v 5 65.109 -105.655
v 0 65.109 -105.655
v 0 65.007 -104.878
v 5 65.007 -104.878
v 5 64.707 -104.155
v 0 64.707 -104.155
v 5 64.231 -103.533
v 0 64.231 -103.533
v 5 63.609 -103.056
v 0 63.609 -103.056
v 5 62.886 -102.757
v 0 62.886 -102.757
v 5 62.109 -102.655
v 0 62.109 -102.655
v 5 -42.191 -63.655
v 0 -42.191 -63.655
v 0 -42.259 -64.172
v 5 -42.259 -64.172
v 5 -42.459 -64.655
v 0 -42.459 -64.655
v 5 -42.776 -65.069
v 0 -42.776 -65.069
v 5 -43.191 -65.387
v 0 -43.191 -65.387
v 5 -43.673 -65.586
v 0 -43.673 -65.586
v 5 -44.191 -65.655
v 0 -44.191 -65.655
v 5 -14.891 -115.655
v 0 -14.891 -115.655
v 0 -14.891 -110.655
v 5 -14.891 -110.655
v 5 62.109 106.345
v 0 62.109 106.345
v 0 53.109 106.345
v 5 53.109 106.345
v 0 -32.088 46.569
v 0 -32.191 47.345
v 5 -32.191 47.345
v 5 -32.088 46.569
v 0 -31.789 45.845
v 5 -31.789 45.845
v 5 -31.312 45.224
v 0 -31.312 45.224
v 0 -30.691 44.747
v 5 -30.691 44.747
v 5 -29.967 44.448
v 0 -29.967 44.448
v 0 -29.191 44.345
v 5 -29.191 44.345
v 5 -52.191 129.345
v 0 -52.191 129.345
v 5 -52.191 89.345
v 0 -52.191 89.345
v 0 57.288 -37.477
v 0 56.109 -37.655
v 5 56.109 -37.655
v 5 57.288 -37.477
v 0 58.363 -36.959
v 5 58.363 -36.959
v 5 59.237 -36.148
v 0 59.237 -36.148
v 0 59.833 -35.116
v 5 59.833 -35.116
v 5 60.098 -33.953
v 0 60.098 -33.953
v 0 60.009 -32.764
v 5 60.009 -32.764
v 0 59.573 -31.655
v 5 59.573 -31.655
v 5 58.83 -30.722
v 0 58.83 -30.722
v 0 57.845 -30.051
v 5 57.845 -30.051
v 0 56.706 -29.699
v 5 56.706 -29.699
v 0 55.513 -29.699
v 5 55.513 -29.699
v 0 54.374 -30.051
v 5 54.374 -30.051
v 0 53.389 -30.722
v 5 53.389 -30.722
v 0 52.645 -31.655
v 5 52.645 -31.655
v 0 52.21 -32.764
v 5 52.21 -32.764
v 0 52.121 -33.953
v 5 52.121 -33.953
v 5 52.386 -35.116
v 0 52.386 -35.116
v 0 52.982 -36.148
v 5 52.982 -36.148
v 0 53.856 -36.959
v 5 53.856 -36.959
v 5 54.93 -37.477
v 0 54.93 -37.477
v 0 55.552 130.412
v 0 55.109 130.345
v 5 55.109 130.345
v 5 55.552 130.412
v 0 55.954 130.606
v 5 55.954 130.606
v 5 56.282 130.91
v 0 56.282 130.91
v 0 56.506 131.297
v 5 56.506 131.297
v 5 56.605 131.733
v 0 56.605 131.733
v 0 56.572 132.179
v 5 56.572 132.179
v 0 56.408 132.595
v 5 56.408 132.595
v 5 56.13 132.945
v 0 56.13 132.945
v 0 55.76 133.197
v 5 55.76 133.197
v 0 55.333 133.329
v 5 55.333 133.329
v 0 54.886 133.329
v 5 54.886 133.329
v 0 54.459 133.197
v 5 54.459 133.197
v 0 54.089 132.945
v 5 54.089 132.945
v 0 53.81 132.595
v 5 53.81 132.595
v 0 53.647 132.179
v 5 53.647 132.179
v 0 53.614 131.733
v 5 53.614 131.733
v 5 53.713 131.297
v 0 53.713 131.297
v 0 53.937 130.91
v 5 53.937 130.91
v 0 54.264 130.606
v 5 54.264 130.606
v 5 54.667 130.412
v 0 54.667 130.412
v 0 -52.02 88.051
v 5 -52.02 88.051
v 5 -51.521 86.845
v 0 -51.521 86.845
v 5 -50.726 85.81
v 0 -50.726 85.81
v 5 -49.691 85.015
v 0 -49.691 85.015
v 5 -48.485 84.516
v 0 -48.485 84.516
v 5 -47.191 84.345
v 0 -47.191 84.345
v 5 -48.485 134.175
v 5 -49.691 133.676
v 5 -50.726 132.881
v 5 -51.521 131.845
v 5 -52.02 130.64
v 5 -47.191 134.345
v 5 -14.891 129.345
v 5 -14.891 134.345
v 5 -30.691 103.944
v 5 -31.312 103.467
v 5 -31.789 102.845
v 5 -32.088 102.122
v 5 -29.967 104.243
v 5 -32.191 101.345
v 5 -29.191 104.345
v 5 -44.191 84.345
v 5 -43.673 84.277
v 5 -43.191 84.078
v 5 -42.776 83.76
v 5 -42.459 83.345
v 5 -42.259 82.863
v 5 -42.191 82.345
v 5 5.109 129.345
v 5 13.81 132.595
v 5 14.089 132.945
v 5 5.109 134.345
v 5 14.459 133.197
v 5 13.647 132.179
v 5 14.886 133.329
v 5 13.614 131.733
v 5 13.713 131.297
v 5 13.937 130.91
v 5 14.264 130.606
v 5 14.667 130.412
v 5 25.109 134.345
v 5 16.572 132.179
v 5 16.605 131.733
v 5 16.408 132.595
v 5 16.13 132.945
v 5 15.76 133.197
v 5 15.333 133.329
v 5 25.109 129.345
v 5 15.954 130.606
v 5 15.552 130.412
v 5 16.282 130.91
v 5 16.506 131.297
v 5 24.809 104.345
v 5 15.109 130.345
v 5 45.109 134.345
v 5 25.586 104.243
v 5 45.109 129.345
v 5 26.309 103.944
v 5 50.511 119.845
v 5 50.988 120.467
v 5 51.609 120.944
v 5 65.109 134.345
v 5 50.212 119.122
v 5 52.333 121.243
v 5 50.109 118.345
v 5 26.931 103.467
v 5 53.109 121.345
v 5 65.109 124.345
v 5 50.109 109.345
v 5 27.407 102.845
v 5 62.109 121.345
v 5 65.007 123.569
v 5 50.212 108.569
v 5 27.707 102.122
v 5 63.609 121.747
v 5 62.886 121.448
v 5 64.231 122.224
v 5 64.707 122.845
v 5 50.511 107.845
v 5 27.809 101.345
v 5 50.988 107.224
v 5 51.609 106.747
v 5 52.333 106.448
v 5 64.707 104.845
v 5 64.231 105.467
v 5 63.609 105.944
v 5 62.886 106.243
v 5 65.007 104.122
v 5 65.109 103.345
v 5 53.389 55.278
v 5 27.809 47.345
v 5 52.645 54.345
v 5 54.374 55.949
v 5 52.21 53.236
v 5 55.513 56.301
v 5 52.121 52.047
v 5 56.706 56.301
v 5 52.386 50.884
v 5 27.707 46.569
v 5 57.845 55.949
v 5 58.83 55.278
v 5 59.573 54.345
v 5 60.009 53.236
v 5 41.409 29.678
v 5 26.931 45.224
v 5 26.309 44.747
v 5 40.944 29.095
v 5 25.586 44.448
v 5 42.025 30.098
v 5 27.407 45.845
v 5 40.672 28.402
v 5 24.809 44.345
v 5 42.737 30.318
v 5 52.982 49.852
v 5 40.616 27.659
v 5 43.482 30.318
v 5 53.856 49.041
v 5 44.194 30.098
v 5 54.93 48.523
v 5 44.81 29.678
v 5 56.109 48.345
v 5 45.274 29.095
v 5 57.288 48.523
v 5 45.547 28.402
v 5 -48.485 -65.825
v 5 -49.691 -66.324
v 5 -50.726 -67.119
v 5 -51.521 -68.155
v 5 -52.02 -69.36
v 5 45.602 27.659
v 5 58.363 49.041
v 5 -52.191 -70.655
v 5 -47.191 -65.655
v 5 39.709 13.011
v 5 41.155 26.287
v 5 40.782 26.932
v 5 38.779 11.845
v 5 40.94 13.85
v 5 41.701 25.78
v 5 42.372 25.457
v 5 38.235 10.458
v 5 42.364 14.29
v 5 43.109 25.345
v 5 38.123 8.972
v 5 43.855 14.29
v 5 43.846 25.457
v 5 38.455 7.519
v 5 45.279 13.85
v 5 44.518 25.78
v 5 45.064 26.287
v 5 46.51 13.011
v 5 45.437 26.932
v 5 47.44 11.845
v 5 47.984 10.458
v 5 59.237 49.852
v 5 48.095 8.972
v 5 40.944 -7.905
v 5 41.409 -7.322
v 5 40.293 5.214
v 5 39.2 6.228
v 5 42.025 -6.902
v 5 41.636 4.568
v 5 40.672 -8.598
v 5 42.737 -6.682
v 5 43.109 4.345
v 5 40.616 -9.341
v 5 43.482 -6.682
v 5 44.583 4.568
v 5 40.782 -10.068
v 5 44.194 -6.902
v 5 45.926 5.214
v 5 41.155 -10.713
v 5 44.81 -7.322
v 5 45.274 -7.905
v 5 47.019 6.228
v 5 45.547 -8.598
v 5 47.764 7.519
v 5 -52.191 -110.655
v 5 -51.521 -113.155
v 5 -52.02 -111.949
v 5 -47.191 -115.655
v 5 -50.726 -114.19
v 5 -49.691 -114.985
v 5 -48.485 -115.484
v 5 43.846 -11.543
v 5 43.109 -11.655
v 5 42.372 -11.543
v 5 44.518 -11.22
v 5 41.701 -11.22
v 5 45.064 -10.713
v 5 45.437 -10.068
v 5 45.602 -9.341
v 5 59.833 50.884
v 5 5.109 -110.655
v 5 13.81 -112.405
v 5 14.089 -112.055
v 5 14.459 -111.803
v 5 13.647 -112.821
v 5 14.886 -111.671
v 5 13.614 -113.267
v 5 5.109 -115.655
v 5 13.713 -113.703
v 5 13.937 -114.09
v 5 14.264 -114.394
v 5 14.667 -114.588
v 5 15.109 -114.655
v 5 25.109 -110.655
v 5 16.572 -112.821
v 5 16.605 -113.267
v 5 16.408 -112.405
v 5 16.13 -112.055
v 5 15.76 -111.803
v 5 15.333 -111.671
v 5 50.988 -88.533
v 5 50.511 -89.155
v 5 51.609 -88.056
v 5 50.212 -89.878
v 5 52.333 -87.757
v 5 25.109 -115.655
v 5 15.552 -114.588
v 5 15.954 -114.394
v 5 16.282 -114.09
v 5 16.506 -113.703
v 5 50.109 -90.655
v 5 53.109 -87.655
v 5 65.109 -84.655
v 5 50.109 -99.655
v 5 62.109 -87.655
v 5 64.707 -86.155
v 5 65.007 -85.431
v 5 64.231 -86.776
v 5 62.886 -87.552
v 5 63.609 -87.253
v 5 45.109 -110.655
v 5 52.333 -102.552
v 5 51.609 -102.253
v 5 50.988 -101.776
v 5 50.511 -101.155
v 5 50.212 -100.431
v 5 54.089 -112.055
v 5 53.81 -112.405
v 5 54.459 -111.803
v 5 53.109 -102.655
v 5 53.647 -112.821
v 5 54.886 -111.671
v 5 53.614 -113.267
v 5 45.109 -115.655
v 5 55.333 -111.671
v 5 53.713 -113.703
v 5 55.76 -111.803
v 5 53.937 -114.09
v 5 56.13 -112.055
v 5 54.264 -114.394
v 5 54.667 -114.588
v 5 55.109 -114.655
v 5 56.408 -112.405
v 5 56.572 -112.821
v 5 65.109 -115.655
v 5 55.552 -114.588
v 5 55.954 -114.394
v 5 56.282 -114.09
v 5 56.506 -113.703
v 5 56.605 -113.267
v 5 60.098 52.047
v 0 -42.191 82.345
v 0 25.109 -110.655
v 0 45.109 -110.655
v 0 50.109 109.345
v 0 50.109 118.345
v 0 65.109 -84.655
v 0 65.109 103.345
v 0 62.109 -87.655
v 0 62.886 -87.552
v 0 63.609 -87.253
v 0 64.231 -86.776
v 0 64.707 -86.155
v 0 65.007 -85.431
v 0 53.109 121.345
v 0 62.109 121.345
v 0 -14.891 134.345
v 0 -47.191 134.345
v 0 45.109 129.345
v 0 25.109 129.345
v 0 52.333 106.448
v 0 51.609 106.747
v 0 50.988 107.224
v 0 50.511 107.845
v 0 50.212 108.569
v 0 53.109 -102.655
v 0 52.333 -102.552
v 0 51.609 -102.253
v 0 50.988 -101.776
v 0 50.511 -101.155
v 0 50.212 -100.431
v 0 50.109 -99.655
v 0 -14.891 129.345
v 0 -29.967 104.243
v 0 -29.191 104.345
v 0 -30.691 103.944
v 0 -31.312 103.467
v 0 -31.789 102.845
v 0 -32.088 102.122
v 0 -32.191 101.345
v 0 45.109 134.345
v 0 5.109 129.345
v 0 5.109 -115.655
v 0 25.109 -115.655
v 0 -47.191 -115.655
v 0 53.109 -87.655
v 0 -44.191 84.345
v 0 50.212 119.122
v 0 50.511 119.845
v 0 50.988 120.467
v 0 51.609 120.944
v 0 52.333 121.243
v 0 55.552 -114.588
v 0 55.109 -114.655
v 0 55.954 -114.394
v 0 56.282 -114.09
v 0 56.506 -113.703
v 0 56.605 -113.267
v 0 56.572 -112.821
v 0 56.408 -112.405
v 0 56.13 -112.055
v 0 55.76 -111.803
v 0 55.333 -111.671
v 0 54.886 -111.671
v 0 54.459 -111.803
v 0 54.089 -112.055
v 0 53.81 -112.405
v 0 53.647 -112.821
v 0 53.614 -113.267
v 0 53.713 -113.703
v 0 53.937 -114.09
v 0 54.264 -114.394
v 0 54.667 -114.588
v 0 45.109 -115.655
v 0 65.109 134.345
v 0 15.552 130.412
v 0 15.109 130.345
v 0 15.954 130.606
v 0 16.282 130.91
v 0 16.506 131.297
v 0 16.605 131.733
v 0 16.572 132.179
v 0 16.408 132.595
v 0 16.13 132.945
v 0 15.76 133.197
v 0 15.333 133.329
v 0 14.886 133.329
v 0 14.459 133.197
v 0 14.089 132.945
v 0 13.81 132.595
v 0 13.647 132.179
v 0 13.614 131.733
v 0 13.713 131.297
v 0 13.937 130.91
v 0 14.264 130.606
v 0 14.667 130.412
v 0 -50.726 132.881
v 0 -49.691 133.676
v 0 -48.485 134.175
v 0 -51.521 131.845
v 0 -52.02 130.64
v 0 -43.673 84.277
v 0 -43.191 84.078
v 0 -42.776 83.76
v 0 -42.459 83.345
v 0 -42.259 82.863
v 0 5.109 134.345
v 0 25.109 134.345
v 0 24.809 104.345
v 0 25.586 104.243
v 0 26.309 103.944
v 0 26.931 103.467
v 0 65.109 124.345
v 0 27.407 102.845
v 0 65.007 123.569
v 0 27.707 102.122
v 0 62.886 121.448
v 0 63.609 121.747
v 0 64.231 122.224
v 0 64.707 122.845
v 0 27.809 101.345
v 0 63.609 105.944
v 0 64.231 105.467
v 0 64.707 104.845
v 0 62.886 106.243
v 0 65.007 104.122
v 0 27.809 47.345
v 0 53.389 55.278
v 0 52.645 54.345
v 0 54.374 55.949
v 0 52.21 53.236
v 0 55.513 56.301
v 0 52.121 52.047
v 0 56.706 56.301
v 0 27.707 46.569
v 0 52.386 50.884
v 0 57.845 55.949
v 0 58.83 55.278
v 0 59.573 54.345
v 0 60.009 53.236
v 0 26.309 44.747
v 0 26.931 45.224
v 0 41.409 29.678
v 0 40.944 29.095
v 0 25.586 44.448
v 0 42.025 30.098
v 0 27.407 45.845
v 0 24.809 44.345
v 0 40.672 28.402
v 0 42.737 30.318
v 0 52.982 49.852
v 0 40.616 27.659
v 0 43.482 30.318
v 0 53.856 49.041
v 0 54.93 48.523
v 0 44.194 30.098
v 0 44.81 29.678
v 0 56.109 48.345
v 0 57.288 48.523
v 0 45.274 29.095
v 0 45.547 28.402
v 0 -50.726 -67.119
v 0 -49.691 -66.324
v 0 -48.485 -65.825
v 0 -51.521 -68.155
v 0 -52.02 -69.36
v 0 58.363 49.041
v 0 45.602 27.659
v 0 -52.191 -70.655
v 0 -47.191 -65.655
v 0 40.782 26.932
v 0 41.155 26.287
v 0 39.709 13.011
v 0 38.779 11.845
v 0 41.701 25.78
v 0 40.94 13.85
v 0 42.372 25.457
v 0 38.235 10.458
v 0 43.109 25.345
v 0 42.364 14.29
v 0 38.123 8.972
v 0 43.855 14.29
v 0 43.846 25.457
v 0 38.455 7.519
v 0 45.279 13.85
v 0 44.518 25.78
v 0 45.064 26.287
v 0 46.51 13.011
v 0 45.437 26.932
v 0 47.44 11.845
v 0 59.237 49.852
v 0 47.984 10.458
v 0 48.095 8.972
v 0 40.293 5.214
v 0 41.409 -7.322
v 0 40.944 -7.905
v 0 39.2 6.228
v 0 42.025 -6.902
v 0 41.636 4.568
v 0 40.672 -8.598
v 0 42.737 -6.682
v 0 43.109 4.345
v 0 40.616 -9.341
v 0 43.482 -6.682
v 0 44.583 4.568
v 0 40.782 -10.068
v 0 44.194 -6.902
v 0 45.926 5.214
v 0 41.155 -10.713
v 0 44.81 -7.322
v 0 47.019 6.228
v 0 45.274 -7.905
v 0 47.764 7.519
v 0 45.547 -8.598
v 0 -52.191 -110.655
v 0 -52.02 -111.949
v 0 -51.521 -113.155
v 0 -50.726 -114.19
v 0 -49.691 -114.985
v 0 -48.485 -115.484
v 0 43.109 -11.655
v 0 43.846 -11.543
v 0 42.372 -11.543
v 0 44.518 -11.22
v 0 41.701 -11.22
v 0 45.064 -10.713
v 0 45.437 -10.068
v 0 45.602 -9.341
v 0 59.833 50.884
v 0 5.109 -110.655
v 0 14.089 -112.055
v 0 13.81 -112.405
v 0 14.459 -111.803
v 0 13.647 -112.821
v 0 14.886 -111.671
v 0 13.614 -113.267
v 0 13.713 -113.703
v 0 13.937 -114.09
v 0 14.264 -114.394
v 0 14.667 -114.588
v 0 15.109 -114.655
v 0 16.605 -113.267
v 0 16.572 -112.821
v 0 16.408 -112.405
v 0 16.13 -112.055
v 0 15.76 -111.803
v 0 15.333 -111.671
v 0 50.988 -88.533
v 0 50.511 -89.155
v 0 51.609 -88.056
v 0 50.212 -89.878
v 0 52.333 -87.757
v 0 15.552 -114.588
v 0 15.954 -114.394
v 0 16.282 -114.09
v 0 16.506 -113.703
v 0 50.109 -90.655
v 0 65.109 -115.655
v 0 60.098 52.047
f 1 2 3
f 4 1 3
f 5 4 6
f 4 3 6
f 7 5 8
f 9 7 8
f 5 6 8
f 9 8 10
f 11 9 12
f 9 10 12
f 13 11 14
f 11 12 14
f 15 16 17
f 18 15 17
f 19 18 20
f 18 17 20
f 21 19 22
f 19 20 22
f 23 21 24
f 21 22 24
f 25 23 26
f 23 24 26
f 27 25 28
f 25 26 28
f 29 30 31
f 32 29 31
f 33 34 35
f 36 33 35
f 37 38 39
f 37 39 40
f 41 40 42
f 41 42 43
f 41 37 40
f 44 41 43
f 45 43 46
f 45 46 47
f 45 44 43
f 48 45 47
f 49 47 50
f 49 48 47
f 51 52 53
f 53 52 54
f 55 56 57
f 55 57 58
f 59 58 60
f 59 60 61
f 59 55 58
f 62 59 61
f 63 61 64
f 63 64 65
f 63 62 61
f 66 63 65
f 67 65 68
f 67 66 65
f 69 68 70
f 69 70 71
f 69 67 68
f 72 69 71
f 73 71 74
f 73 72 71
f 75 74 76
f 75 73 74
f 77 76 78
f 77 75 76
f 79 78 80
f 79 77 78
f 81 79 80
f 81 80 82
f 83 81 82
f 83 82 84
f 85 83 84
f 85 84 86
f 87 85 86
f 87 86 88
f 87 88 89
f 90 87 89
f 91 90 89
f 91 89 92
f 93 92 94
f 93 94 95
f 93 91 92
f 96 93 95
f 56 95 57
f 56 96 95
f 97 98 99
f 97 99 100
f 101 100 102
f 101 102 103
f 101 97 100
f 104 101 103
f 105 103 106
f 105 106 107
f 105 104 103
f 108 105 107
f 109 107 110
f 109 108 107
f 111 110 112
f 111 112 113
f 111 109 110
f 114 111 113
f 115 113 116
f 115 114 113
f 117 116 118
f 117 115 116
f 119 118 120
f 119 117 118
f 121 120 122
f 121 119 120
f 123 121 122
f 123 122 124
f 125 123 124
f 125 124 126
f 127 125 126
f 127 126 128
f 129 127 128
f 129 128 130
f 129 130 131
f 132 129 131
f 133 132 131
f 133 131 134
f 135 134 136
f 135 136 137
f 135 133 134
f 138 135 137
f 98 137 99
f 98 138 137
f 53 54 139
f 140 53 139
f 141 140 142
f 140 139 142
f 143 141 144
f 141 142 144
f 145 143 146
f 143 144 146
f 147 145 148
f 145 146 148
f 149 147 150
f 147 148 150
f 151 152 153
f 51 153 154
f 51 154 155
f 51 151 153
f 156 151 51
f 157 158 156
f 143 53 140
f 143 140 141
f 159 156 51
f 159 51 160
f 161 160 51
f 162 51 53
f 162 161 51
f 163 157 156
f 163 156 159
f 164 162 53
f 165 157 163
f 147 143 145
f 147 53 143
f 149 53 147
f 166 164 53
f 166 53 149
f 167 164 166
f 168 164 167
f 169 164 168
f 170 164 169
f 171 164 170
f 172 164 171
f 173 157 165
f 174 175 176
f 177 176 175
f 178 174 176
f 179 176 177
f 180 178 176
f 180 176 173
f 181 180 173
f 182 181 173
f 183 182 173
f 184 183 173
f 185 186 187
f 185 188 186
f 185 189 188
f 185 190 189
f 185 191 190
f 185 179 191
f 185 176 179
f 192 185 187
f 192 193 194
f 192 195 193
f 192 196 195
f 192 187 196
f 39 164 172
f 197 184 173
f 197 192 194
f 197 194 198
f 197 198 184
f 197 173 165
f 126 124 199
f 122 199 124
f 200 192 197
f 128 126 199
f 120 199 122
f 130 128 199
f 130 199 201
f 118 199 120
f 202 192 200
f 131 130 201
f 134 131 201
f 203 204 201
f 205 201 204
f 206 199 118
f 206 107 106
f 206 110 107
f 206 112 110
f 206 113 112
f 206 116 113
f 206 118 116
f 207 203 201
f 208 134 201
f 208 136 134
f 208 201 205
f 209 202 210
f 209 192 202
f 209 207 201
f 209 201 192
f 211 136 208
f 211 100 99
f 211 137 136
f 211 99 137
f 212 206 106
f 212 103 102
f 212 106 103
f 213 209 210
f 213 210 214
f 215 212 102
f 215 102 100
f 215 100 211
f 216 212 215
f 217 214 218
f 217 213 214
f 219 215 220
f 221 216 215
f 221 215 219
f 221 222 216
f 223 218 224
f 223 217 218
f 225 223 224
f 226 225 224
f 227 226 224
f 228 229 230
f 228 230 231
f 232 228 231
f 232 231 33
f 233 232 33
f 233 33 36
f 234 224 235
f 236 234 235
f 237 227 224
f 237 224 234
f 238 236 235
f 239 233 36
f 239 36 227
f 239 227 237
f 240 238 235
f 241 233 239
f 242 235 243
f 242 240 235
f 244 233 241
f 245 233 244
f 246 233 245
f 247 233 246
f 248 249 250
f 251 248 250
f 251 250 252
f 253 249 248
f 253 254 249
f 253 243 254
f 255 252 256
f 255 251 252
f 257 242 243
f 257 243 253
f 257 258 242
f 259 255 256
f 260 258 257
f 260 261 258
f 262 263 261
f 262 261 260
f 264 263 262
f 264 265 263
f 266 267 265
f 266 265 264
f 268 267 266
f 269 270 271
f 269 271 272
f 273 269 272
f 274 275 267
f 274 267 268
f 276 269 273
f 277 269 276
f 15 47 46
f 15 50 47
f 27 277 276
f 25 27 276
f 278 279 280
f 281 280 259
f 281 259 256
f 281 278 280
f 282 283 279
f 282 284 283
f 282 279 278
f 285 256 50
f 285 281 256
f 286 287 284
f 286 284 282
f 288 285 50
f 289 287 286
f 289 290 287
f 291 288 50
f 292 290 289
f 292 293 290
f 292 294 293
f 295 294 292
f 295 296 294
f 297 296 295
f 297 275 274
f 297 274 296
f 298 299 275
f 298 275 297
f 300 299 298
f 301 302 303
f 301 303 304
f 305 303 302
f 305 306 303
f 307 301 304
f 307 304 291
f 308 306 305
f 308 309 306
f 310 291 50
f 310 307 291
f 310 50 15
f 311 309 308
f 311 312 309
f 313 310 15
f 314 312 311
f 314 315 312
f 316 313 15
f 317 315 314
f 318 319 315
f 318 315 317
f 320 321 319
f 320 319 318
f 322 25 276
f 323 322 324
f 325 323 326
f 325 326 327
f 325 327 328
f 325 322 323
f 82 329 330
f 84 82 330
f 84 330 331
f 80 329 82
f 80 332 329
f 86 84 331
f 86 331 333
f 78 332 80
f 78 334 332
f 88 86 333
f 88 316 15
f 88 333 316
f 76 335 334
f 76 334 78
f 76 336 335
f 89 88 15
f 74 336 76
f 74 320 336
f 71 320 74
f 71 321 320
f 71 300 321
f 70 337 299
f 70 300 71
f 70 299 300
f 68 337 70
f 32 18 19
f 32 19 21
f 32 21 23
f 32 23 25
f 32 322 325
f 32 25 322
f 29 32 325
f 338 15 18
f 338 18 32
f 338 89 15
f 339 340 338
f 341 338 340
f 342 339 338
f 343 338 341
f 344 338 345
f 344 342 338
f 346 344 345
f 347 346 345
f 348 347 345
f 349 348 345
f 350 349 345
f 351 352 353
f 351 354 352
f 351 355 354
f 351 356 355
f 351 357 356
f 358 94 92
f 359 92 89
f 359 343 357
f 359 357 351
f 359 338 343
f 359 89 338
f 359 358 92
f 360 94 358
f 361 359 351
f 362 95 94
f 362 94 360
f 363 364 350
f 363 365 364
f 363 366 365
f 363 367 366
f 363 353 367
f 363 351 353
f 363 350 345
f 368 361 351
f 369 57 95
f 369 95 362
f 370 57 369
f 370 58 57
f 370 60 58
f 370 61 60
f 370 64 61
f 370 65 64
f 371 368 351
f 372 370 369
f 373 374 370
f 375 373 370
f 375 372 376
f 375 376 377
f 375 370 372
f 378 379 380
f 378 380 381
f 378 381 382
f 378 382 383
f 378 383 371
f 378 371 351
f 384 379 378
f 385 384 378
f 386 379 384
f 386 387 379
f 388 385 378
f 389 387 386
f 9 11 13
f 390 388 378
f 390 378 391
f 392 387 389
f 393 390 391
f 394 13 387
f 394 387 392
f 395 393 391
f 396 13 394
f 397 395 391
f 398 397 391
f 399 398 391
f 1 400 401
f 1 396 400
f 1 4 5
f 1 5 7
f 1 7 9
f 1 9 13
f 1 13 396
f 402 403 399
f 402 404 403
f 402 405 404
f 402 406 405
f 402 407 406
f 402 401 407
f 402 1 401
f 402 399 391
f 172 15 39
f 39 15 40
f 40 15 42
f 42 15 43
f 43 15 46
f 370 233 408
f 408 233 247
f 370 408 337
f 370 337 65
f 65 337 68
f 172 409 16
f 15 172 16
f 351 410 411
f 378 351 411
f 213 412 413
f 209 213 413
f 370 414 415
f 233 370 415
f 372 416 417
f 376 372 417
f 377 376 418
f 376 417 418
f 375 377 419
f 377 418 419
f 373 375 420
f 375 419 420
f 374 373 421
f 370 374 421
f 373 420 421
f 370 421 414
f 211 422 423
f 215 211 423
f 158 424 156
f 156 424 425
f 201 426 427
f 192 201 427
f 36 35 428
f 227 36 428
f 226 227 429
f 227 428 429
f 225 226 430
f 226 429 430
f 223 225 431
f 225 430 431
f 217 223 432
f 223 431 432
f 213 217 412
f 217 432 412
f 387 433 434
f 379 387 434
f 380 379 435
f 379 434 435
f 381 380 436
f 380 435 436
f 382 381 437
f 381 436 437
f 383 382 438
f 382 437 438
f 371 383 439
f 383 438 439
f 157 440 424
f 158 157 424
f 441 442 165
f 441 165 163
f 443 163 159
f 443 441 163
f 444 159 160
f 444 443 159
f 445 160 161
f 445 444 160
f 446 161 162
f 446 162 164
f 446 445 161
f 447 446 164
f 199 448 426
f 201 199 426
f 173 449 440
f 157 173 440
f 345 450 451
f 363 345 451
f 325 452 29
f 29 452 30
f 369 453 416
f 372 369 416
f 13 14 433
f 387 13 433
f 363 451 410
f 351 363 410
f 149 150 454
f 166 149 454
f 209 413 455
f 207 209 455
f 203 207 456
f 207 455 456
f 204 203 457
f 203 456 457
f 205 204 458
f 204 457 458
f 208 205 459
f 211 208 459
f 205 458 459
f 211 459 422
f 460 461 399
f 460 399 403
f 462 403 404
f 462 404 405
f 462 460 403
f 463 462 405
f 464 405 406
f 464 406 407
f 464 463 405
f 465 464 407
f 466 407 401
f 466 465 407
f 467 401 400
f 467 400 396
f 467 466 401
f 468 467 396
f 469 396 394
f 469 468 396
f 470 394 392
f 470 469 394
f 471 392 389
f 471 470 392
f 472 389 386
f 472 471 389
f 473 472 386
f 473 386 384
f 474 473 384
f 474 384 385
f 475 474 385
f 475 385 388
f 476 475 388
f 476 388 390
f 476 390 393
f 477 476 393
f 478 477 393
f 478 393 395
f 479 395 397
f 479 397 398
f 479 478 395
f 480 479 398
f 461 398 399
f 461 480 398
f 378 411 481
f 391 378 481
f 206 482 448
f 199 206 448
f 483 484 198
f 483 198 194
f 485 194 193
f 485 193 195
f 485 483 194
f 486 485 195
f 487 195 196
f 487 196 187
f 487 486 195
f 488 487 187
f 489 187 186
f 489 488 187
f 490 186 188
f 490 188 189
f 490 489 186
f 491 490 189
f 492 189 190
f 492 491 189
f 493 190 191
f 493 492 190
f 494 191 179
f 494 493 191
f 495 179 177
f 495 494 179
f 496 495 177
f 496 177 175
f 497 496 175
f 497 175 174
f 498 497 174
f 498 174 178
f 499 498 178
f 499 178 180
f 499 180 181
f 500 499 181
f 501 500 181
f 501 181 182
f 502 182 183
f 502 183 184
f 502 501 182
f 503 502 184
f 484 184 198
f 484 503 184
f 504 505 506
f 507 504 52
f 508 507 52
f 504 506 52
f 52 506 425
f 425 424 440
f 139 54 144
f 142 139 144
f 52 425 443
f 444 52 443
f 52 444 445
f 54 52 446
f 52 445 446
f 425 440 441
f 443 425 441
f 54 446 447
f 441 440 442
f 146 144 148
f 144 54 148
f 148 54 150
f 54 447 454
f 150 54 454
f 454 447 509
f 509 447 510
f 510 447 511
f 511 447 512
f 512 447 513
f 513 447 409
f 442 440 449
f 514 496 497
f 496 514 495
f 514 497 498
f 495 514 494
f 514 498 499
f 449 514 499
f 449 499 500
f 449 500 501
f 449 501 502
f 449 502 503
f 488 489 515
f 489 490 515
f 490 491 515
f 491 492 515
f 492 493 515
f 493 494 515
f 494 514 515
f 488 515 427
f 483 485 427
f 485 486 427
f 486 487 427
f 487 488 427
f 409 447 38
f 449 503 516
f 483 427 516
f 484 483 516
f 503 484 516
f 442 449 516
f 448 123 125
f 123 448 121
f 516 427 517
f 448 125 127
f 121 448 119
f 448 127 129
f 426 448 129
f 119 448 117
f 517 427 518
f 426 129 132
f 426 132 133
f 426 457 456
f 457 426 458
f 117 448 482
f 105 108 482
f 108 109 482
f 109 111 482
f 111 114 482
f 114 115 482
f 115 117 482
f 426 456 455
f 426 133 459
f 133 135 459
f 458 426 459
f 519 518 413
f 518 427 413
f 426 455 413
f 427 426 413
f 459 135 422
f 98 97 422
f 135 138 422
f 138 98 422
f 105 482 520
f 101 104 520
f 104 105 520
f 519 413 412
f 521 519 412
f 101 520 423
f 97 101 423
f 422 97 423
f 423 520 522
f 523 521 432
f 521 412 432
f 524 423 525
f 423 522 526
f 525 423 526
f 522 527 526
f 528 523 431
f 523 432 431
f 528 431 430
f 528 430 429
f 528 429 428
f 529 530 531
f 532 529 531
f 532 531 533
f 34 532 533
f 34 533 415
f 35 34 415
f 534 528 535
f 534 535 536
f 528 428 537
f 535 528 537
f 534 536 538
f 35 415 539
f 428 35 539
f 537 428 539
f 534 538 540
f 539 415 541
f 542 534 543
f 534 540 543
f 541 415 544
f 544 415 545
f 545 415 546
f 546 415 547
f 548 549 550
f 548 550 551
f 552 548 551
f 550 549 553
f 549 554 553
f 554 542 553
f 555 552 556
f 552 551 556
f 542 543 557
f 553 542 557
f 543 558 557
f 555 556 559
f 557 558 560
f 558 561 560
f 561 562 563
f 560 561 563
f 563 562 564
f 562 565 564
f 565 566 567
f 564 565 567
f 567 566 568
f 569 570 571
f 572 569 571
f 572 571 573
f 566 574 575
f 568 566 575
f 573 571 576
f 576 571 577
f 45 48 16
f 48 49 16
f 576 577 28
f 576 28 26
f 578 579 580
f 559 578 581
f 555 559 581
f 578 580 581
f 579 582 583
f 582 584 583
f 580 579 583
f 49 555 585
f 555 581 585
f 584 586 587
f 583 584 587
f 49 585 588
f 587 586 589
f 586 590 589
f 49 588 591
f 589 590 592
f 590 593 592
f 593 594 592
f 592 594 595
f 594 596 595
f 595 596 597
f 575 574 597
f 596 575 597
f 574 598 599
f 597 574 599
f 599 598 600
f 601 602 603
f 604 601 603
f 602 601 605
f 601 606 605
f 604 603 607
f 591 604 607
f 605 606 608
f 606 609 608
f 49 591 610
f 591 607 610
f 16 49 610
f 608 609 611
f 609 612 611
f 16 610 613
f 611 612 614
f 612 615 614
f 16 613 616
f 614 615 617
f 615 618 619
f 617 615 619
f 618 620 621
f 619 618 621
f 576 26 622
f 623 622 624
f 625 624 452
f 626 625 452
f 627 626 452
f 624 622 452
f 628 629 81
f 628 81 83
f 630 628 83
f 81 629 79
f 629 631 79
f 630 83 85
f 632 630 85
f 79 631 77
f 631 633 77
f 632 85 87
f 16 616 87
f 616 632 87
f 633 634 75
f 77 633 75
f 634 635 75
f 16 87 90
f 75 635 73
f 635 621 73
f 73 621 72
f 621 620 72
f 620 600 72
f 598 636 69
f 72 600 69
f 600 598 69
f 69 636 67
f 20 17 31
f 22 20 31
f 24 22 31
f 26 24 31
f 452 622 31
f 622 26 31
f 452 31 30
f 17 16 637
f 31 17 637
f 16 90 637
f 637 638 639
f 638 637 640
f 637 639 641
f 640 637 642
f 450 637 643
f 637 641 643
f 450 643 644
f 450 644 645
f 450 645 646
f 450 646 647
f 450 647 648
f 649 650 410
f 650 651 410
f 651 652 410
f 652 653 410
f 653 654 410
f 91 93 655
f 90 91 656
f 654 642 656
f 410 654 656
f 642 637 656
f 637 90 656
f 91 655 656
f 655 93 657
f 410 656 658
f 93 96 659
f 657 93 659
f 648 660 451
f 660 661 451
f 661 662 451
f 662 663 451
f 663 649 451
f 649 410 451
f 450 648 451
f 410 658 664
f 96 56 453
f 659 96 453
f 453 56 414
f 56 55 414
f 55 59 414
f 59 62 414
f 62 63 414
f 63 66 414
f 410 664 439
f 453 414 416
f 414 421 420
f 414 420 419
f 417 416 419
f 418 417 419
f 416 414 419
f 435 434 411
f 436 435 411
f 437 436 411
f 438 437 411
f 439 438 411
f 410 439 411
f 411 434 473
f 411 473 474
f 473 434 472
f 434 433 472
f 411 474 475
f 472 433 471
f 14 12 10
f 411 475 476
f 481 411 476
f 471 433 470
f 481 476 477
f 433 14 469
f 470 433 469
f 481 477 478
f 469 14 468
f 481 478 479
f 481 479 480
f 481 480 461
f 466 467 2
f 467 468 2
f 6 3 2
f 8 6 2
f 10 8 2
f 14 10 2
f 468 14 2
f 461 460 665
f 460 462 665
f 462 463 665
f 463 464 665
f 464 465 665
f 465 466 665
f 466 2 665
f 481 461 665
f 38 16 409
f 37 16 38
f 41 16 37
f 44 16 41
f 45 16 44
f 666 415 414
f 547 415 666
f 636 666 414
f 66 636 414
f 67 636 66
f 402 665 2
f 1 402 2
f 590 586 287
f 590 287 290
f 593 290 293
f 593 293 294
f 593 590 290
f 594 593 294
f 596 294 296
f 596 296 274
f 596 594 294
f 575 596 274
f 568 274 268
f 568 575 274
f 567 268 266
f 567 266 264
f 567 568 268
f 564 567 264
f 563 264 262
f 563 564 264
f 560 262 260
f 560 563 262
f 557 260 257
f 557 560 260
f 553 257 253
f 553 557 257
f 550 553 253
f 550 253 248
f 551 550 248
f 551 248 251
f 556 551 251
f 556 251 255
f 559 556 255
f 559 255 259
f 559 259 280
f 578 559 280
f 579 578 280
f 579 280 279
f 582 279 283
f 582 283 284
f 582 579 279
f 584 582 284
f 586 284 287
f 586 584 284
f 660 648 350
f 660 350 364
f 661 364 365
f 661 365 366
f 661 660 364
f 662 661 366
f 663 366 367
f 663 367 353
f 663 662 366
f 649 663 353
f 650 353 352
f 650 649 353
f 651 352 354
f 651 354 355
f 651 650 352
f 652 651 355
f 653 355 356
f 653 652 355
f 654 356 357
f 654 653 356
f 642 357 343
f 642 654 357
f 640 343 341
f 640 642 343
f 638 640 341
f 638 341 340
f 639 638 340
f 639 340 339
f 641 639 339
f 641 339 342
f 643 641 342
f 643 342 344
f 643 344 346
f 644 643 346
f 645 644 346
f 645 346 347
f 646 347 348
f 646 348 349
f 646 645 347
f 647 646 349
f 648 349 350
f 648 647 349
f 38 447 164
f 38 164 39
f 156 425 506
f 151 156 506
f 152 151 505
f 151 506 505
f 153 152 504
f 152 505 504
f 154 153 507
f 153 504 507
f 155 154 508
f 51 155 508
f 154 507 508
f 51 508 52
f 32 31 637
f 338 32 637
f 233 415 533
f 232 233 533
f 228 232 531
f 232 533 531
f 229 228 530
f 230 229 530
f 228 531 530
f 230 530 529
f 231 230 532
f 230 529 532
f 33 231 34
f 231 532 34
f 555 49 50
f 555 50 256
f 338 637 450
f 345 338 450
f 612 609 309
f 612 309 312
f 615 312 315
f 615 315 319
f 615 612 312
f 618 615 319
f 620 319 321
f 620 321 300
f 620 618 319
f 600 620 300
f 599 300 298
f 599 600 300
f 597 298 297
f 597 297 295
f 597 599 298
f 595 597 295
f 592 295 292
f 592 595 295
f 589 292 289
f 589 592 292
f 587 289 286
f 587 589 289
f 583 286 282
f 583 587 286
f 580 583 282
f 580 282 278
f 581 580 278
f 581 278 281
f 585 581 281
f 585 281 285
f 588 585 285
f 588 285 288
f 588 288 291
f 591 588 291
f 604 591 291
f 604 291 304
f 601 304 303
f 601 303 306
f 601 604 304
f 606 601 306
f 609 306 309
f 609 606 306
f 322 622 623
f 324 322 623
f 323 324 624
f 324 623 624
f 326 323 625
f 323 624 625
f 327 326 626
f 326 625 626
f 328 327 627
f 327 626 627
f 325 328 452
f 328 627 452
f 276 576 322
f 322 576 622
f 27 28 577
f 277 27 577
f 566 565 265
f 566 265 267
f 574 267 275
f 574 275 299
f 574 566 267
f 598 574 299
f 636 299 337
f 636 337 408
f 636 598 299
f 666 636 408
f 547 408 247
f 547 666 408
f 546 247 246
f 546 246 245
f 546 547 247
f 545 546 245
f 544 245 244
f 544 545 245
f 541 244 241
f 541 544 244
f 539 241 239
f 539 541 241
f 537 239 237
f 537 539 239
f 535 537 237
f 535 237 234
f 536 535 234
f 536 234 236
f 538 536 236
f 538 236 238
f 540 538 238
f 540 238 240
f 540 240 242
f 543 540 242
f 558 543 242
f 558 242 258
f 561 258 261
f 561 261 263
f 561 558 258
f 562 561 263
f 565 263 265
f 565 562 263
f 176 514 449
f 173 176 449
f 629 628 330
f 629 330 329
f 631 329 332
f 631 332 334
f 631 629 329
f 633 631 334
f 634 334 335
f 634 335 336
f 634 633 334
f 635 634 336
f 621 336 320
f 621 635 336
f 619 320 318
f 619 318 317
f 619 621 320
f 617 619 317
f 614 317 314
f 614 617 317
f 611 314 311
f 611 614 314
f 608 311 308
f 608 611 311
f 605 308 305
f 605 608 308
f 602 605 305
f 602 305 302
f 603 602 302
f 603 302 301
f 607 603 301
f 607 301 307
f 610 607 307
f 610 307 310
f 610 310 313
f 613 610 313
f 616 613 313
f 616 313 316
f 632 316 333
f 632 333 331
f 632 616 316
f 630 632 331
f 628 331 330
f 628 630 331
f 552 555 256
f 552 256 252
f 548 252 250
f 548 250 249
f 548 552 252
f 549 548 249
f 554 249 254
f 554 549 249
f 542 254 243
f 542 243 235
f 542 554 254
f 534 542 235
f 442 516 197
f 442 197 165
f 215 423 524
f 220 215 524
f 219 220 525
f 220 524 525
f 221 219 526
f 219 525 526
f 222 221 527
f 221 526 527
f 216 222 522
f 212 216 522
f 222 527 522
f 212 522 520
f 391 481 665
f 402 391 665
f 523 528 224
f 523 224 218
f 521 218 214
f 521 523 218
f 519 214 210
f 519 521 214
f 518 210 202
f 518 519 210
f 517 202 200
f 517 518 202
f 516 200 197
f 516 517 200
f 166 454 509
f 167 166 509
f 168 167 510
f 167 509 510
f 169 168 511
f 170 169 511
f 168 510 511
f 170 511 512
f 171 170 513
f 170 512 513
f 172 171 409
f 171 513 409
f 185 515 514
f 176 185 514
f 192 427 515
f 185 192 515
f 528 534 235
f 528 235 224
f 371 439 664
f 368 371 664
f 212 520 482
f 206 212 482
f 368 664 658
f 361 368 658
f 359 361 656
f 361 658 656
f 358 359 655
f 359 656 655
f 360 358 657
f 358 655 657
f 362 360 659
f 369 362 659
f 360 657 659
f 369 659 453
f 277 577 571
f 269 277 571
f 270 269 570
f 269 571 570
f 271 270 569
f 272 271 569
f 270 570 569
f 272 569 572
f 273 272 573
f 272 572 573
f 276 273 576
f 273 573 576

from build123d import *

# Parameters (mm, degrees)
SKETCH_1_R      = 4
SKETCH_1_R_2    = 5
SKETCH_1_R_3    = 2.5
SKETCH_1_R_4    = 1.5
EXTRUDE_1_DEPTH = 5


with BuildPart() as part:
    # 草图1 → 凸台-拉伸1 (new body)
    with BuildSketch(Plane(origin=(0, 0, 0), x_dir=(0, 0, -1), z_dir=(1, 0, 0))):
        with BuildLine():
            Line((-84.345470911, -47.190619808), (-84.345470911, -44.190619808))
            ThreePointArc((-84.345470911, -44.190619808), (-83.759684473, -42.776406245), (-82.345470911, -42.190619808))
            Line((-82.345470911, -42.190619808), (63.654529089, -42.190619808))
            ThreePointArc((63.654529089, -42.190619808), (65.068742652, -42.776406245), (65.654529089, -44.190619808))
            Line((65.654529089, -44.190619808), (65.654529089, -47.190619808))
            ThreePointArc((65.654529089, -47.190619808), (67.118995184, -50.726153713), (70.654529089, -52.190619808))
            Line((70.654529089, -52.190619808), (110.654529089, -52.190619808))
            ThreePointArc((110.654529089, -52.190619808), (114.190062995, -50.726153713), (115.654529089, -47.190619808))
            Line((115.654529089, -47.190619808), (115.654529089, -14.890619808))
            Line((115.654529089, -14.890619808), (110.654529089, -14.890619808))
            Line((110.654529089, -14.890619808), (110.654529089, 5.109380192))
            Line((110.654529089, 5.109380192), (115.654529089, 5.109380192))
            Line((115.654529089, 5.109380192), (115.654529089, 25.109380192))
            Line((115.654529089, 25.109380192), (110.654529089, 25.109380192))
            Line((110.654529089, 25.109380192), (110.654529089, 45.109380192))
            Line((110.654529089, 45.109380192), (115.654529089, 45.109380192))
            Line((115.654529089, 45.109380192), (115.654529089, 65.109380192))
            Line((115.654529089, 65.109380192), (105.654529089, 65.109380192))
            ThreePointArc((105.654529089, 65.109380192), (103.533208746, 64.230700536), (102.654529089, 62.109380192))
            Line((102.654529089, 62.109380192), (102.654529089, 53.109380192))
            ThreePointArc((102.654529089, 53.109380192), (101.775849433, 50.988059849), (99.654529089, 50.109380192))
            Line((99.654529089, 50.109380192), (90.654529089, 50.109380192))
            ThreePointArc((90.654529089, 50.109380192), (88.533208746, 50.988059849), (87.654529089, 53.109380192))
            Line((87.654529089, 53.109380192), (87.654529089, 62.109380192))
            ThreePointArc((87.654529089, 62.109380192), (86.775849433, 64.230700536), (84.654529089, 65.109380192))
            Line((84.654529089, 65.109380192), (-103.345470911, 65.109380192))
            ThreePointArc((-103.345470911, 65.109380192), (-105.466791254, 64.230700536), (-106.345470911, 62.109380192))
            Line((-106.345470911, 62.109380192), (-106.345470911, 53.109380192))
            ThreePointArc((-106.345470911, 53.109380192), (-107.224150567, 50.988059849), (-109.345470911, 50.109380192))
            Line((-109.345470911, 50.109380192), (-118.345470911, 50.109380192))
            ThreePointArc((-118.345470911, 50.109380192), (-120.466791254, 50.988059849), (-121.345470911, 53.109380192))
            Line((-121.345470911, 53.109380192), (-121.345470911, 62.109380192))
            ThreePointArc((-121.345470911, 62.109380192), (-122.224150567, 64.230700536), (-124.345470911, 65.109380192))
            Line((-124.345470911, 65.109380192), (-134.345470911, 65.109380192))
            Line((-134.345470911, 65.109380192), (-134.345470911, 45.109380192))
            Line((-134.345470911, 45.109380192), (-129.345470911, 45.109380192))
            Line((-129.345470911, 45.109380192), (-129.345470911, 25.109380192))
            Line((-129.345470911, 25.109380192), (-134.345470911, 25.109380192))
            Line((-134.345470911, 25.109380192), (-134.345470911, 5.109380192))
            Line((-134.345470911, 5.109380192), (-129.345470911, 5.109380192))
            Line((-129.345470911, 5.109380192), (-129.345470911, -14.890619808))
            Line((-129.345470911, -14.890619808), (-134.345470911, -14.890619808))
            Line((-134.345470911, -14.890619808), (-134.345470911, -47.190619808))
            ThreePointArc((-134.345470911, -47.190619808), (-132.881004816, -50.726153713), (-129.345470911, -52.190619808))
            Line((-129.345470911, -52.190619808), (-89.345470911, -52.190619808))
            ThreePointArc((-89.345470911, -52.190619808), (-85.809937005, -50.726153713), (-84.345470911, -47.190619808))
        make_face()
        with Locations((33.654529089, 56.109380192)):
            Circle(SKETCH_1_R, mode=Mode.SUBTRACT)
        with Locations((-52.345470911, 56.109380192)):
            Circle(SKETCH_1_R, mode=Mode.SUBTRACT)
        with Locations((-9.345470911, 43.109380192)):
            Circle(SKETCH_1_R_2, mode=Mode.SUBTRACT)
        with Locations((9.154529089, 43.109380192)):
            Circle(SKETCH_1_R_3, mode=Mode.SUBTRACT)
        with Locations((-27.845470911, 43.109380192)):
            Circle(SKETCH_1_R_3, mode=Mode.SUBTRACT)
        with Locations((113.154529089, 55.109380192)):
            Circle(SKETCH_1_R_4, mode=Mode.SUBTRACT)
        with Locations((-131.845470911, 55.109380192)):
            Circle(SKETCH_1_R_4, mode=Mode.SUBTRACT)
        with Locations((-131.845470911, 15.109380192)):
            Circle(SKETCH_1_R_4, mode=Mode.SUBTRACT)
        with Locations((113.154529089, 15.109380192)):
            Circle(SKETCH_1_R_4, mode=Mode.SUBTRACT)
        with BuildLine():
            Line((-101.345470911, -32.190619808), (-47.345470911, -32.190619808))
            ThreePointArc((-47.345470911, -32.190619808), (-45.224150567, -31.311940151), (-44.345470911, -29.190619808))
            Line((-44.345470911, -29.190619808), (-44.345470911, 24.809380192))
            ThreePointArc((-44.345470911, 24.809380192), (-45.224150567, 26.930700536), (-47.345470911, 27.809380192))
            Line((-47.345470911, 27.809380192), (-101.345470911, 27.809380192))
            ThreePointArc((-101.345470911, 27.809380192), (-103.466791254, 26.930700536), (-104.345470911, 24.809380192))
            Line((-104.345470911, 24.809380192), (-104.345470911, -29.190619808))
            ThreePointArc((-104.345470911, -29.190619808), (-103.466791254, -31.311940151), (-101.345470911, -32.190619808))
        make_face(mode=Mode.SUBTRACT)
    extrude(amount=EXTRUDE_1_DEPTH)


solid = part.part
